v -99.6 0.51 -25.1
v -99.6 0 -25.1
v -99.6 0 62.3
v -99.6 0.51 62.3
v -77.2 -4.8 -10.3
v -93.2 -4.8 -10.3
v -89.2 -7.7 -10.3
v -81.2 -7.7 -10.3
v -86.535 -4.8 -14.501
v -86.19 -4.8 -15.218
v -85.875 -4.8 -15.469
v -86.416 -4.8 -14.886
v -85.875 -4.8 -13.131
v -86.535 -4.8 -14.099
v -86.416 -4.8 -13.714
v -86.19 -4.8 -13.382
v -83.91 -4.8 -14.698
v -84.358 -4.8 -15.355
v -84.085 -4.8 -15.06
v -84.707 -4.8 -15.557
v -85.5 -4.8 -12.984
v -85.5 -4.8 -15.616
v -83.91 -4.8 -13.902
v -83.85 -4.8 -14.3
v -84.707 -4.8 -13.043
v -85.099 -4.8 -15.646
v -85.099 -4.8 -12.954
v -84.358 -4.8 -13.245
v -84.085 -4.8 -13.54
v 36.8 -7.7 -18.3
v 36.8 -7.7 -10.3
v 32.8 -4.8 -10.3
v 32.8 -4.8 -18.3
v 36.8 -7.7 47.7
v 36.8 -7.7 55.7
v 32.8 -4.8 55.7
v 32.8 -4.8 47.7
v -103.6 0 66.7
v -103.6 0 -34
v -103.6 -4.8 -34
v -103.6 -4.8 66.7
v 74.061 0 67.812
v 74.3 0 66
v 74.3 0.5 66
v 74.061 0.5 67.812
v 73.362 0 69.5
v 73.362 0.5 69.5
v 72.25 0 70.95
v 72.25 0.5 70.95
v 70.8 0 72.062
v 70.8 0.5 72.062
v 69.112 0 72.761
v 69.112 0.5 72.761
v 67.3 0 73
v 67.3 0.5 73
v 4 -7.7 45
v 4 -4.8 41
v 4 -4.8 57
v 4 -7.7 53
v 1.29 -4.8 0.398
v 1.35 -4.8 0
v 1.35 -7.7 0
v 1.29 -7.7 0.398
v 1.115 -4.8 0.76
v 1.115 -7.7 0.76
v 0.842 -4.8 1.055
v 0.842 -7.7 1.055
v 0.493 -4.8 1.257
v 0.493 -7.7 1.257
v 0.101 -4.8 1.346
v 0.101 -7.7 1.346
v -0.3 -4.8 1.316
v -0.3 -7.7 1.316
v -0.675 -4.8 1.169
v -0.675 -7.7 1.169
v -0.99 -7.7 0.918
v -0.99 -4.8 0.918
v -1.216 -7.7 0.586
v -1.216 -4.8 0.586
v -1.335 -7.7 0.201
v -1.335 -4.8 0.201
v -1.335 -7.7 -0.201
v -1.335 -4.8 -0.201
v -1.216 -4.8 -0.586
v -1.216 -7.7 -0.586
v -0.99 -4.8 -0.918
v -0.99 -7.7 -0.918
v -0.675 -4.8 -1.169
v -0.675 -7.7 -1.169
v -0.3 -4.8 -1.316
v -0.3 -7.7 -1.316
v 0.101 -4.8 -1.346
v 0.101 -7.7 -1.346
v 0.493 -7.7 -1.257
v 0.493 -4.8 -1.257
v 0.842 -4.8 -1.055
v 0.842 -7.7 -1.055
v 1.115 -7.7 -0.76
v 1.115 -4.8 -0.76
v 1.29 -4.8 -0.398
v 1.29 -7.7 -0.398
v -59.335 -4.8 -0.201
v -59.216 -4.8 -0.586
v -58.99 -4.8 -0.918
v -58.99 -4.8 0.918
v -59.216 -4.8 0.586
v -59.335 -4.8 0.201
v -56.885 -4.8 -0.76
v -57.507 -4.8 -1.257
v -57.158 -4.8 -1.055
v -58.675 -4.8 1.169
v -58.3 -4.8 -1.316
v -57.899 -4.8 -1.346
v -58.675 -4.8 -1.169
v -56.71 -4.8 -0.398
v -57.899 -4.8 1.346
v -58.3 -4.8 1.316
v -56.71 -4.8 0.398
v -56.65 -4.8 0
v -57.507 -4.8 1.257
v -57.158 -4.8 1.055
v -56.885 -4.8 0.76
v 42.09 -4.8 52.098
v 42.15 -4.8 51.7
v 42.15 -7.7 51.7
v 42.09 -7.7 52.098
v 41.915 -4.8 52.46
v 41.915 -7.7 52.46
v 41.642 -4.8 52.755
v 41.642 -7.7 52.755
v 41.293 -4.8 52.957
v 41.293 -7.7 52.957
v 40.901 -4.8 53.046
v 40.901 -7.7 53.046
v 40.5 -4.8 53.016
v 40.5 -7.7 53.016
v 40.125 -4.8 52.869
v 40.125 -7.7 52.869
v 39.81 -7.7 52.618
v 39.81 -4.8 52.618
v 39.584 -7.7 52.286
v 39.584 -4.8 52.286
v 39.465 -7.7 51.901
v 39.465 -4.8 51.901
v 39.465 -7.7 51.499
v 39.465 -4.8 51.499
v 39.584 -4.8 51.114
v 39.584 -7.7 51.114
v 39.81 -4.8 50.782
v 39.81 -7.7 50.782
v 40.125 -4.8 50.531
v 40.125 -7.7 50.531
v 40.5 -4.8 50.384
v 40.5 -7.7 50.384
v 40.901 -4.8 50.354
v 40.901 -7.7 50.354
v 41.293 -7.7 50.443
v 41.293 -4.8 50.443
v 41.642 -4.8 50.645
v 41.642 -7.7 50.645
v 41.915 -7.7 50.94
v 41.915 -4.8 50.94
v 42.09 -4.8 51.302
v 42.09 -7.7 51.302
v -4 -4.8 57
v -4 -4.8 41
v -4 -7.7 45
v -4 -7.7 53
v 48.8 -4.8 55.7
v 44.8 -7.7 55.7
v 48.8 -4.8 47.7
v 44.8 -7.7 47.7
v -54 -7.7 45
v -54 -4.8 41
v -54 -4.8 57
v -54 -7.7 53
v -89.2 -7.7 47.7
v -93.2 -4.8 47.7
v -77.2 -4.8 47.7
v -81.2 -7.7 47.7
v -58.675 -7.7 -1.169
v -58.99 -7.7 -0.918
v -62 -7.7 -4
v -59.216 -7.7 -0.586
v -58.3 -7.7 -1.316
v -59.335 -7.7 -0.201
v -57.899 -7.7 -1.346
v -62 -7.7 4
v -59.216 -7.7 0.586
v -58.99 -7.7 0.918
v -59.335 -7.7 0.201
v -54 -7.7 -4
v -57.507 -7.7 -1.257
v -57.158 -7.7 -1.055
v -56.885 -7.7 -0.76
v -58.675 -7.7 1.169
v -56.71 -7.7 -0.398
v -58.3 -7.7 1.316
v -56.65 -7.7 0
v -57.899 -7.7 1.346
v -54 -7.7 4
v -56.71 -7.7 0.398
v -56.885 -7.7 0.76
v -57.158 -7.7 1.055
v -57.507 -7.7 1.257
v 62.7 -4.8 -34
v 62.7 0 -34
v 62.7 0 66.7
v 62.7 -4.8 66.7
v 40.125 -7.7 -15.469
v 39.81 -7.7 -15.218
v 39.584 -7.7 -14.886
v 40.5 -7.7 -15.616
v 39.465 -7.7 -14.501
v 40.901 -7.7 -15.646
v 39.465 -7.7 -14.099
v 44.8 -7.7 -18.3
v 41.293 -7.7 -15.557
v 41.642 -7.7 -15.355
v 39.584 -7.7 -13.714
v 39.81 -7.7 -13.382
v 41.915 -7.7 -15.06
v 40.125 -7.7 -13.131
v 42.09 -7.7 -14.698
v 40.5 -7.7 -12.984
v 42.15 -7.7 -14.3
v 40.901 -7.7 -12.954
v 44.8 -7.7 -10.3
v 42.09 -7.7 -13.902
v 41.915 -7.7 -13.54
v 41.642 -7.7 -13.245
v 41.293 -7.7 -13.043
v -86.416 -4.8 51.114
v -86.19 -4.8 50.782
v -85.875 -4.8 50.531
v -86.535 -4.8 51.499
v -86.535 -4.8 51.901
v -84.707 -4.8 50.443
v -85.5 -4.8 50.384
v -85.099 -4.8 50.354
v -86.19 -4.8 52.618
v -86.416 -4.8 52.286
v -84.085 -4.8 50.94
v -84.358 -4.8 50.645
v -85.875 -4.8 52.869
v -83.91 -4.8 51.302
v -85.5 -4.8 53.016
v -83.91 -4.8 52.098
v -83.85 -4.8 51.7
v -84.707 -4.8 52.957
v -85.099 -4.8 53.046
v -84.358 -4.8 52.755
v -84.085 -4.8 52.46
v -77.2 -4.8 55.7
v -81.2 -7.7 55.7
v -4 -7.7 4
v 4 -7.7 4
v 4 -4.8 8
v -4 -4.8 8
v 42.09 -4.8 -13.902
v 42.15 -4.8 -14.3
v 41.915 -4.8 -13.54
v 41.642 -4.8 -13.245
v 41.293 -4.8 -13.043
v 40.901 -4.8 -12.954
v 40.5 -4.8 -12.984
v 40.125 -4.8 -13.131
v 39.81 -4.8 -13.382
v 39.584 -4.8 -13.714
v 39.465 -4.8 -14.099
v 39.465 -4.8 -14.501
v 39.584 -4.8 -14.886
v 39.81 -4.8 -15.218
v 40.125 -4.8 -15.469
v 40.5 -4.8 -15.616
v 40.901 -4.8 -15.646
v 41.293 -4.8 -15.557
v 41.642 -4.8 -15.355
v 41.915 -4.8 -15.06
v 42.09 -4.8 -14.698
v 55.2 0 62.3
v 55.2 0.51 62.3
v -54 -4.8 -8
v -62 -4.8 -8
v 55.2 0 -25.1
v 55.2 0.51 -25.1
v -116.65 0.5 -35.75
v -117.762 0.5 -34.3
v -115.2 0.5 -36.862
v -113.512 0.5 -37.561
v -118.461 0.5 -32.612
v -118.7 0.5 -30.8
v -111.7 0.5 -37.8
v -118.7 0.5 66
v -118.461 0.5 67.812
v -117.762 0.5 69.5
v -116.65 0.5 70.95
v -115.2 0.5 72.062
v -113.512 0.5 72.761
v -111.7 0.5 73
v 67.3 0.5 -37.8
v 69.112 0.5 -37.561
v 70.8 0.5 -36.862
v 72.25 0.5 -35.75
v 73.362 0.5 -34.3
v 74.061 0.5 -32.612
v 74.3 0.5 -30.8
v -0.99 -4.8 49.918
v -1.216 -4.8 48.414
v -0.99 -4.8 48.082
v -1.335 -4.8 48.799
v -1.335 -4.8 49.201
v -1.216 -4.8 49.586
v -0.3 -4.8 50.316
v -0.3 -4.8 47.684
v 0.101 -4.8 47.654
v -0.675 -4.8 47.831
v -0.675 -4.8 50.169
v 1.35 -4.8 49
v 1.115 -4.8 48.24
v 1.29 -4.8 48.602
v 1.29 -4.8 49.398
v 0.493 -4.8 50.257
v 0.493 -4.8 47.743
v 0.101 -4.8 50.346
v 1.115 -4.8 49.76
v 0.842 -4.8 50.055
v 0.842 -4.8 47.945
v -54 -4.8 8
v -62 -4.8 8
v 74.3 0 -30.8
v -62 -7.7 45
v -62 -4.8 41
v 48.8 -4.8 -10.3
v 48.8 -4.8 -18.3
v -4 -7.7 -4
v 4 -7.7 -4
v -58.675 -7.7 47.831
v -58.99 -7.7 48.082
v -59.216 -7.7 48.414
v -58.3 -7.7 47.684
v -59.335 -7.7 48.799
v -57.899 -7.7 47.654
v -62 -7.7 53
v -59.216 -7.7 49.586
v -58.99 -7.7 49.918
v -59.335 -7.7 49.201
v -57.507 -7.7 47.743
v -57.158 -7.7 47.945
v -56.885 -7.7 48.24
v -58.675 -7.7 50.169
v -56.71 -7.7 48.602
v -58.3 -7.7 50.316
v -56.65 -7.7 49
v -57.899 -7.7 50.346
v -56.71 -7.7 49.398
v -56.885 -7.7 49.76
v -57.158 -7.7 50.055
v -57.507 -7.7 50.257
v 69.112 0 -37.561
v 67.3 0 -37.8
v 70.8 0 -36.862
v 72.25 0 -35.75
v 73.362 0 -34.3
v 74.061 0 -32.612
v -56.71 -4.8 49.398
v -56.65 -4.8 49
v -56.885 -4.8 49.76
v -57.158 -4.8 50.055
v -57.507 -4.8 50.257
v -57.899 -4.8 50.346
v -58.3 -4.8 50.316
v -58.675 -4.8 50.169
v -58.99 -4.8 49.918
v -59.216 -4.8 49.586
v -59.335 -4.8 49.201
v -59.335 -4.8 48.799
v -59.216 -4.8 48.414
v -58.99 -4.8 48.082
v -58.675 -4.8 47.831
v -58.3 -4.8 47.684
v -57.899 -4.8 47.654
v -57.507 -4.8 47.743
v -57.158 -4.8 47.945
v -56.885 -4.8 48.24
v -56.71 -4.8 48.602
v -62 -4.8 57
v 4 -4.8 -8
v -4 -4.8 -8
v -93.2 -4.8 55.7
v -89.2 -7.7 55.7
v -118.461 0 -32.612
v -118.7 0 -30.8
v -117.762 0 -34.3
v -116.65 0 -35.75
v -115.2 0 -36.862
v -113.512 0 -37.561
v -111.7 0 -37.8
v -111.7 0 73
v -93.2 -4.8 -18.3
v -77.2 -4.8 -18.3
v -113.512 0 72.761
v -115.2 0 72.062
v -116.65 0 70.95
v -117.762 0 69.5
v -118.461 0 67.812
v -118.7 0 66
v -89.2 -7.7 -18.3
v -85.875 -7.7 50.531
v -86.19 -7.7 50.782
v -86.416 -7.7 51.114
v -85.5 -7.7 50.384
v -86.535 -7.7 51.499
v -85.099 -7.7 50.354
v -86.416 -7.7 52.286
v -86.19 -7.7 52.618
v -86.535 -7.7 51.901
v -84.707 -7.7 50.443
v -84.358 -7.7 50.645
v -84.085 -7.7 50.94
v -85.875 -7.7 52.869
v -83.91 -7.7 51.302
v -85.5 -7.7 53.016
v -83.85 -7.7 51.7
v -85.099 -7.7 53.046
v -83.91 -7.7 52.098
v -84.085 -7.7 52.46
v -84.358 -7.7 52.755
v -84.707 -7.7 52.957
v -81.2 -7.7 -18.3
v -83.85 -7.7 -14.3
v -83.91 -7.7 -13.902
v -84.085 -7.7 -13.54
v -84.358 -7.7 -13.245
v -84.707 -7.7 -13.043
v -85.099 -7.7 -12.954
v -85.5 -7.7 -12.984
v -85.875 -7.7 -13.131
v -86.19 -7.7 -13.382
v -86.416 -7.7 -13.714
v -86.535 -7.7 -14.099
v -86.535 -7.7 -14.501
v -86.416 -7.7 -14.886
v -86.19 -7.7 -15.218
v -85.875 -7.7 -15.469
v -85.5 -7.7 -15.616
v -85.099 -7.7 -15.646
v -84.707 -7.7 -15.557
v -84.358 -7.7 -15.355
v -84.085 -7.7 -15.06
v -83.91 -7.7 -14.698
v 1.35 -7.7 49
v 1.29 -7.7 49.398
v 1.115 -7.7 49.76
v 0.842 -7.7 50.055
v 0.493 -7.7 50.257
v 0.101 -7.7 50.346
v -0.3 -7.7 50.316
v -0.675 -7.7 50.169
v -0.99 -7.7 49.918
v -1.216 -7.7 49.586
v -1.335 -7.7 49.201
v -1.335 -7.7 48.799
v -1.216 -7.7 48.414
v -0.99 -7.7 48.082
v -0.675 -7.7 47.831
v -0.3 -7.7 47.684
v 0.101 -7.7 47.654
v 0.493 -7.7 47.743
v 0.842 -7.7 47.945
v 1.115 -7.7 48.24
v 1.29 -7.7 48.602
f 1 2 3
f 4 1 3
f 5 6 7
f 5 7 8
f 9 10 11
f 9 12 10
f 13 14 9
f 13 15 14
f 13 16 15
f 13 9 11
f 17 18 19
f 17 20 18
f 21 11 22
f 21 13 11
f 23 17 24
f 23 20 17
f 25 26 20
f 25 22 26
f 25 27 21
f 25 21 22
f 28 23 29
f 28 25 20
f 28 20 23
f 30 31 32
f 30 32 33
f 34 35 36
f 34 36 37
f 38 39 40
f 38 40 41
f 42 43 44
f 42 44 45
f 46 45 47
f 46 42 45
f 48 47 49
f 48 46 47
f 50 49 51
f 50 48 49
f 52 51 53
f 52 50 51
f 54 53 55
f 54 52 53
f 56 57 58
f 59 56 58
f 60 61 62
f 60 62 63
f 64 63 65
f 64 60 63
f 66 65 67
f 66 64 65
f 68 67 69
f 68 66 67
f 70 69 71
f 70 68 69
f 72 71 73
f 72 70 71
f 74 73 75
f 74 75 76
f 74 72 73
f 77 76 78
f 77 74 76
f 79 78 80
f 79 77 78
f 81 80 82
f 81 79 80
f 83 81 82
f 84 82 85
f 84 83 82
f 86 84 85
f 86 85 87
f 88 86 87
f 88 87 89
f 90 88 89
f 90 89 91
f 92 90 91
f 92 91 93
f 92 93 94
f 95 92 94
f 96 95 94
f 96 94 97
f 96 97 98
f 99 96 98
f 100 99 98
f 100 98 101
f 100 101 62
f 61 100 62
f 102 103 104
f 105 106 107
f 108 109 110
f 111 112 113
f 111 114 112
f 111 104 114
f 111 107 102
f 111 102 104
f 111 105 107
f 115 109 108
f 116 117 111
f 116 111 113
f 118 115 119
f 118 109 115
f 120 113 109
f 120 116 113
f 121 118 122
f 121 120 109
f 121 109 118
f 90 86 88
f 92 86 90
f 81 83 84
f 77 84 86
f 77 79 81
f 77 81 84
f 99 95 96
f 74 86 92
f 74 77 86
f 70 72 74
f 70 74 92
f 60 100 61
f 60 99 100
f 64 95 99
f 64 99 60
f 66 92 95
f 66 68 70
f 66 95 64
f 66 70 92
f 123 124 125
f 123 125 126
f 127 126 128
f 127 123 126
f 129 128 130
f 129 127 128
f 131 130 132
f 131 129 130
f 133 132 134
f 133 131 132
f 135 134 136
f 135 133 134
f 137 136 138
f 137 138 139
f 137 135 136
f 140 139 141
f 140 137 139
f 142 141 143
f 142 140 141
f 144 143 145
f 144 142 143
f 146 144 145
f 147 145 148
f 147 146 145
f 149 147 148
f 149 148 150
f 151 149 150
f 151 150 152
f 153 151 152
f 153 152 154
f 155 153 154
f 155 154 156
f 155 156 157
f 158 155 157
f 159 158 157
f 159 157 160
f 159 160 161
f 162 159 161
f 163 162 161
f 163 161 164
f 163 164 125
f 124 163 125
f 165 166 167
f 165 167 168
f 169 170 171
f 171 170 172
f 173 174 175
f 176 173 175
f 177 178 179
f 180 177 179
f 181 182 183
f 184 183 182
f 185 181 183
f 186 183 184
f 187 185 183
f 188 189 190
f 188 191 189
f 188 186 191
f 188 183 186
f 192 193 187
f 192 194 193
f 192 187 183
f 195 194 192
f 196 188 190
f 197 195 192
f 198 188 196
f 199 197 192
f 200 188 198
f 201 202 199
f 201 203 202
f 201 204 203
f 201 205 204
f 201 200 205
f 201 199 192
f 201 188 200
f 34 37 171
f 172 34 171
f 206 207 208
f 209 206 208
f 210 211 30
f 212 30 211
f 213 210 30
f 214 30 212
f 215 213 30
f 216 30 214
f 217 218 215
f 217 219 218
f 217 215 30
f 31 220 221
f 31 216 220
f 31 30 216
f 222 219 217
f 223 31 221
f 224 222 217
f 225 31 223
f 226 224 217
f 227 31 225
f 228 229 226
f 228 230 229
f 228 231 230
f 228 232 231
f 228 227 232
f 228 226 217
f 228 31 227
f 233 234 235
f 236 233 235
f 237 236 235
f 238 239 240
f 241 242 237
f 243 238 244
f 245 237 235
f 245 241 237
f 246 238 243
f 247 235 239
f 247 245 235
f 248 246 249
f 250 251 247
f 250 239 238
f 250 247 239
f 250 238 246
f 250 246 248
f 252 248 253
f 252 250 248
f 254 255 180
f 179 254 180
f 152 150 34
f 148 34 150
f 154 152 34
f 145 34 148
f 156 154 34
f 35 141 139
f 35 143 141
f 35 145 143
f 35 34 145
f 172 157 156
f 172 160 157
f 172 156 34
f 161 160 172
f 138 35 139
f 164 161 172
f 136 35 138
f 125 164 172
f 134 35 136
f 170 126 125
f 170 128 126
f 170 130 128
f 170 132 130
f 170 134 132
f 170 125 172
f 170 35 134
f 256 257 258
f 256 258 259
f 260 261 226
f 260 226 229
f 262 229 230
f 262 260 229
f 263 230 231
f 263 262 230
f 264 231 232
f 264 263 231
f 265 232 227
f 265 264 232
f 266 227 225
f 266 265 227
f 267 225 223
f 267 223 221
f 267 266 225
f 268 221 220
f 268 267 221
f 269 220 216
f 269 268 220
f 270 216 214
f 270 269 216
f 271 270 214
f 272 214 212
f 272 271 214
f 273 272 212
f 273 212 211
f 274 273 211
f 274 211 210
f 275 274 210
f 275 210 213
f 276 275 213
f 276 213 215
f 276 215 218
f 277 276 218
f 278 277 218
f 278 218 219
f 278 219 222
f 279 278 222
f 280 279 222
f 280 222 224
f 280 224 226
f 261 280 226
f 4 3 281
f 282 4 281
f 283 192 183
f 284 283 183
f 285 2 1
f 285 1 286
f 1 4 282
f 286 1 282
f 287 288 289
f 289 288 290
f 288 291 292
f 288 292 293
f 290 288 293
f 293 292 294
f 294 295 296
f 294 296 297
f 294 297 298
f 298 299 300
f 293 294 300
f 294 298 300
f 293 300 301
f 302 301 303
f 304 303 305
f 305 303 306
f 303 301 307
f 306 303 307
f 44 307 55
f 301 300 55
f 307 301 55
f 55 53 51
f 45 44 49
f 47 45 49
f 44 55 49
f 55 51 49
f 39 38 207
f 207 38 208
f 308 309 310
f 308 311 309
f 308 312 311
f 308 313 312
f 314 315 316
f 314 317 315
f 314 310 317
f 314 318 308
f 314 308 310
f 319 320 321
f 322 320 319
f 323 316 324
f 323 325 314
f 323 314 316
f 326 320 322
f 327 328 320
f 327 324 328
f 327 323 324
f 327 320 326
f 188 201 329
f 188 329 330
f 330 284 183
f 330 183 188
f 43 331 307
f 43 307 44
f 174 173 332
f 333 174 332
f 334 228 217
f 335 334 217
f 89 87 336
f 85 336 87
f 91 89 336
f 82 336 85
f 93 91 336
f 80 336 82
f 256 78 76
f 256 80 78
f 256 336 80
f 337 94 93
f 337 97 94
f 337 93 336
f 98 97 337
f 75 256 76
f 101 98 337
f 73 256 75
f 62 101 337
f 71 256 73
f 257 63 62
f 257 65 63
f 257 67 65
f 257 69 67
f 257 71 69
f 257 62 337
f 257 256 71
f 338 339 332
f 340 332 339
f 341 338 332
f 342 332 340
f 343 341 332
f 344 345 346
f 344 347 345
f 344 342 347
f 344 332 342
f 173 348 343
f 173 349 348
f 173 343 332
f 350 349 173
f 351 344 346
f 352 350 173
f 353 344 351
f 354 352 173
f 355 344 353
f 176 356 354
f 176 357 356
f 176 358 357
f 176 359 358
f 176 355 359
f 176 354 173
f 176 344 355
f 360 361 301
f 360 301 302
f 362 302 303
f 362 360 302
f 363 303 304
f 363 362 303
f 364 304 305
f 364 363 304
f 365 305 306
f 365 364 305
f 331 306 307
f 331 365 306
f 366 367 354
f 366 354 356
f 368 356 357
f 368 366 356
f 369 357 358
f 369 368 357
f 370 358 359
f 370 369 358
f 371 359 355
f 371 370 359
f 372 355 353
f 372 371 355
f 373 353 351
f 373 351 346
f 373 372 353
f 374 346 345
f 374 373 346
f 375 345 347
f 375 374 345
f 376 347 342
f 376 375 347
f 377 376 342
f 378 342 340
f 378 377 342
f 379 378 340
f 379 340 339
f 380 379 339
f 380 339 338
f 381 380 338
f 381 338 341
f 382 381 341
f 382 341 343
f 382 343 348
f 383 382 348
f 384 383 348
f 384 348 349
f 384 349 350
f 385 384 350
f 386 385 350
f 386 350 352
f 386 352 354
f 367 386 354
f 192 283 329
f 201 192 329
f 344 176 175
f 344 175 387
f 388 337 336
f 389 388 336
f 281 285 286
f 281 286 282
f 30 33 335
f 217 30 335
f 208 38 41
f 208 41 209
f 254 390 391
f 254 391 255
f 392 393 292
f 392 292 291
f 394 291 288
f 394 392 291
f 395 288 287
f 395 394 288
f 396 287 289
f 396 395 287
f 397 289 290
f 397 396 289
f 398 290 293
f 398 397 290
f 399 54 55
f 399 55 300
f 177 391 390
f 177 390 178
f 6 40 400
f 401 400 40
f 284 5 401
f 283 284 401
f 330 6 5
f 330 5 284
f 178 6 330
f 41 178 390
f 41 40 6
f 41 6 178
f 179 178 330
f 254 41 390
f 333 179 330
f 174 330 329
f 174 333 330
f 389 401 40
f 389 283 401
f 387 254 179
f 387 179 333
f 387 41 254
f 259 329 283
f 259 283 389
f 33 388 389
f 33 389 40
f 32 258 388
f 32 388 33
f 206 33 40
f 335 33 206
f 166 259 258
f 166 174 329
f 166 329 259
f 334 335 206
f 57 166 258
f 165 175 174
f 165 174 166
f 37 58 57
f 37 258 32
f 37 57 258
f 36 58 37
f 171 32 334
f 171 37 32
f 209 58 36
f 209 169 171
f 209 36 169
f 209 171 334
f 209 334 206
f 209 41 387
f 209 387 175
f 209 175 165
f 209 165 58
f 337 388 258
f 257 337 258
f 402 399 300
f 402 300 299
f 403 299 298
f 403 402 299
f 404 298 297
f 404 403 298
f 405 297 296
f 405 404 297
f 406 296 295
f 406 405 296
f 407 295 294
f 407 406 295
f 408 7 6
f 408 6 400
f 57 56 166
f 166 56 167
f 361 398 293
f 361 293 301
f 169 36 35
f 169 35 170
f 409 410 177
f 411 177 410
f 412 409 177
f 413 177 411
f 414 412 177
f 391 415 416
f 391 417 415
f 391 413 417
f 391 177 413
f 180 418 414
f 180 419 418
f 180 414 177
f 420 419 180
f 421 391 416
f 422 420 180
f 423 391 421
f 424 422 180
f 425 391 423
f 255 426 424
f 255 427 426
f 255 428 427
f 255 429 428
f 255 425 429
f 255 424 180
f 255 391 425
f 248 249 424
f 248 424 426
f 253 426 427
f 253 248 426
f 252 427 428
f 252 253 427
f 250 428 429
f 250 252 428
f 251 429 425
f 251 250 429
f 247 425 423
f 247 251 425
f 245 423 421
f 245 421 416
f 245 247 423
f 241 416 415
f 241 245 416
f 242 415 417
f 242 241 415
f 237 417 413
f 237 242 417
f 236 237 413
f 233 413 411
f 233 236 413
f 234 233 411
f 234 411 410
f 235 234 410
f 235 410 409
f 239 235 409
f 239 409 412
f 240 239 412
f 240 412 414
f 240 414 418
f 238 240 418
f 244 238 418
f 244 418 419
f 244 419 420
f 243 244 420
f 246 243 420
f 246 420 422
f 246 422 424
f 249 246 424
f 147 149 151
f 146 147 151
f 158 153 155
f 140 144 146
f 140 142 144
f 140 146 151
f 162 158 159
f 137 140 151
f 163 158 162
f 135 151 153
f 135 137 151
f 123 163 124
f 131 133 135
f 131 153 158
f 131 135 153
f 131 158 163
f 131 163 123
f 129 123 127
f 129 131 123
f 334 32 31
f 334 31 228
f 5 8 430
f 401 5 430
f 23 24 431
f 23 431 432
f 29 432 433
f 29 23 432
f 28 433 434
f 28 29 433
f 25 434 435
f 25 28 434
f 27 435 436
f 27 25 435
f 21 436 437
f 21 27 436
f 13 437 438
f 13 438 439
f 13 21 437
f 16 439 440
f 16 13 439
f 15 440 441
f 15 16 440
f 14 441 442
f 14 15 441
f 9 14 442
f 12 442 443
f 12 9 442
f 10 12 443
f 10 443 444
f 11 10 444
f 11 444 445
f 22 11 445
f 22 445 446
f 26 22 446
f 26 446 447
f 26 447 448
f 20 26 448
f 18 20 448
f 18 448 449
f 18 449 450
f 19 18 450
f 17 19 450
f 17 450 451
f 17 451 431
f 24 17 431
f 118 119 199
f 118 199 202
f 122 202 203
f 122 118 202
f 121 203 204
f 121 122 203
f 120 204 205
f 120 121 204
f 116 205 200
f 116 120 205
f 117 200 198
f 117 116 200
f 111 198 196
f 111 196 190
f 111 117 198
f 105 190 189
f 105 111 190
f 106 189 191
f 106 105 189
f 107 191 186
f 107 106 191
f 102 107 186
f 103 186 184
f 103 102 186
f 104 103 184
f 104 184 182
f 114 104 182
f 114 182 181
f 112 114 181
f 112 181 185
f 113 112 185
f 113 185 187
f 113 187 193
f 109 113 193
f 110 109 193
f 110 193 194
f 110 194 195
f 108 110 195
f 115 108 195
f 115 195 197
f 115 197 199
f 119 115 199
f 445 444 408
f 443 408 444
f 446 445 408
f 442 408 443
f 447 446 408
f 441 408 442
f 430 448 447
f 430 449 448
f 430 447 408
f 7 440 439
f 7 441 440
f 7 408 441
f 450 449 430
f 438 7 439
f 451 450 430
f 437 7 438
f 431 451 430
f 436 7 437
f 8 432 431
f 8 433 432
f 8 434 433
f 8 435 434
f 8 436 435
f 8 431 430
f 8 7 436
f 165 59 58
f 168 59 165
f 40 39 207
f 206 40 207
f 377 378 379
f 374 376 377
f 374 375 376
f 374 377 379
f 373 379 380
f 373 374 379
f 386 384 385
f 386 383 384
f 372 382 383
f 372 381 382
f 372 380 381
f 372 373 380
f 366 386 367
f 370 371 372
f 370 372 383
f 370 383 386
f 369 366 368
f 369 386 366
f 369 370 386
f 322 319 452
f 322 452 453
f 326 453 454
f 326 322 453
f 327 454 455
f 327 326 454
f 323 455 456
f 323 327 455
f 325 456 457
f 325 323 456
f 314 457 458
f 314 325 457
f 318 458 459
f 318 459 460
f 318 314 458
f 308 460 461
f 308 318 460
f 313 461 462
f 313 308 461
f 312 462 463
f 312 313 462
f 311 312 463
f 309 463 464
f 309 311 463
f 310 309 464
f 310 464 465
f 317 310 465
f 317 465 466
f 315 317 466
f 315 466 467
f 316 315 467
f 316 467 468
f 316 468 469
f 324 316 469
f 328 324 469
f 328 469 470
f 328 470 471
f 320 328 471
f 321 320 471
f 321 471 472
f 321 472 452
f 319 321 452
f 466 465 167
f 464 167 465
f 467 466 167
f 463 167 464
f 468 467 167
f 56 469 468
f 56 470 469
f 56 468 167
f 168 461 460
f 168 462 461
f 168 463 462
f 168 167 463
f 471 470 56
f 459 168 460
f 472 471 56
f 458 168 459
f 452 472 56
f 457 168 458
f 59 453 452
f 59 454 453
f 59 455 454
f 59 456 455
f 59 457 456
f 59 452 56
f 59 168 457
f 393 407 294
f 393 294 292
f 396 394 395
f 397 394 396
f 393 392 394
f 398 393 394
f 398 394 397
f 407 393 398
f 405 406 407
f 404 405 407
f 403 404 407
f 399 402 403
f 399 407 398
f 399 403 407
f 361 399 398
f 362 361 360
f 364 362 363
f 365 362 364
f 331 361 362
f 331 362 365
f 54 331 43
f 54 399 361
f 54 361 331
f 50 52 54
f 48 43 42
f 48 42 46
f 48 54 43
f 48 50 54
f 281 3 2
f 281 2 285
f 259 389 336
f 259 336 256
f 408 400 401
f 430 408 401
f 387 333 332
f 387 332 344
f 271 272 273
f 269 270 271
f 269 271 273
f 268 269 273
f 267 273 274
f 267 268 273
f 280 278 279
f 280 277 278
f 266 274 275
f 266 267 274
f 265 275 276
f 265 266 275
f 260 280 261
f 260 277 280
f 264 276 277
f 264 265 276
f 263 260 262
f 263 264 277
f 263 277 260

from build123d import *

# Parameters (mm, degrees)
F0_W     = 166.3
F0_H     = 100.7
F0_W_2   = 154.8
F0_H_2   = 87.4
F0_W_3   = 8
F0_H_3   = 8
F0_R     = 1.35
F1_DEPTH = 0.5
F2_DEPTH = 4.8
F3_DEPTH = 7.7
F4_SIZE2 = 2.89999
F4_SIZE  = 3.99999
F5_DEPTH = 0.51


# Not quite as in the source:
# - a fillet or chamfer is up to 0.001 mm smaller than in the source, because OpenCascade refuses the exact size


with BuildPart() as f1:
    # F0 (on Front) → F1 (new body)
    with BuildSketch(Plane.XZ):
        with BuildLine():
            Line((67.3, 73), (-111.7, 73))
            ThreePointArc((-111.7, 73), (-116.6497474683, 70.9497474683), (-118.7, 66))
            Line((-118.7, 66), (-118.7, -30.8))
            ThreePointArc((-118.7, -30.8), (-116.6497474683, -35.7497474683), (-111.7, -37.8))
            Line((-111.7, -37.8), (67.3, -37.8))
            ThreePointArc((67.3, -37.8), (72.2497474683, -35.7497474683), (74.3, -30.8))
            Line((74.3, -30.8), (74.3, 66))
            ThreePointArc((74.3, 66), (72.2497474683, 70.9497474683), (67.3, 73))
        make_face()
        with Locations((-20.45, 16.35)):
            Rectangle(F0_W, F0_H, mode=Mode.SUBTRACT)
        with Locations((-20.45, 16.35)):
            Rectangle(F0_W, F0_H)
        with Locations((-22.2, 18.6)):
            Rectangle(F0_W_2, F0_H_2, mode=Mode.SUBTRACT)
        with Locations((-22.2, 18.6)):
            Rectangle(F0_W_2, F0_H_2)
        with Locations((-85.2, -14.3)):
            Rectangle(F0_W_3, F0_H_3, mode=Mode.SUBTRACT)
        with Locations((-58, 0)):
            Rectangle(F0_W_3, F0_H_3, mode=Mode.SUBTRACT)
        with Locations((40.8, -14.3)):
            Rectangle(F0_W_3, F0_H_3, mode=Mode.SUBTRACT)
        Rectangle(F0_W_3, F0_H_3, mode=Mode.SUBTRACT)
        with Locations((-85.2, 51.7)):
            Rectangle(F0_W_3, F0_H_3, mode=Mode.SUBTRACT)
        with Locations((-58, 49)):
            Rectangle(F0_W_3, F0_H_3, mode=Mode.SUBTRACT)
        with Locations((0, 49)):
            Rectangle(F0_W_3, F0_H_3, mode=Mode.SUBTRACT)
        with Locations((40.8, 51.7)):
            Rectangle(F0_W_3, F0_H_3, mode=Mode.SUBTRACT)
        with Locations((-58, 49)):
            Rectangle(F0_W_3, F0_H_3)
        with Locations((-58, 49)):
            Circle(F0_R, mode=Mode.SUBTRACT)
        with Locations((-85.2, 51.7)):
            Rectangle(F0_W_3, F0_H_3)
        with Locations((-85.2, 51.7)):
            Circle(F0_R, mode=Mode.SUBTRACT)
        with Locations((40.8, 51.7)):
            Rectangle(F0_W_3, F0_H_3)
        with Locations((40.8, 51.7)):
            Circle(F0_R, mode=Mode.SUBTRACT)
        Rectangle(F0_W_3, F0_H_3)
        Circle(F0_R, mode=Mode.SUBTRACT)
        with Locations((40.8, -14.3)):
            Rectangle(F0_W_3, F0_H_3)
        with Locations((40.8, -14.3)):
            Circle(F0_R, mode=Mode.SUBTRACT)
        with Locations((0, 49)):
            Rectangle(F0_W_3, F0_H_3)
        with Locations((0, 49)):
            Circle(F0_R, mode=Mode.SUBTRACT)
        with Locations((-58, 0)):
            Rectangle(F0_W_3, F0_H_3)
        with Locations((-58, 0)):
            Circle(F0_R, mode=Mode.SUBTRACT)
        with Locations((-85.2, -14.3)):
            Rectangle(F0_W_3, F0_H_3)
        with Locations((-85.2, -14.3)):
            Circle(F0_R, mode=Mode.SUBTRACT)
        with Locations((0, 49)):
            Circle(F0_R)
        with Locations((40.8, 51.7)):
            Circle(F0_R)
        with Locations((40.8, -14.3)):
            Circle(F0_R)
        Circle(F0_R)
        with Locations((-58, 49)):
            Circle(F0_R)
        with Locations((-58, 0)):
            Circle(F0_R)
        with Locations((-85.2, 51.7)):
            Circle(F0_R)
        with Locations((-85.2, -14.3)):
            Circle(F0_R)
    extrude(amount=-F1_DEPTH)


with BuildPart() as f2:
    # F0 (on Front) → F2 (new body)
    with BuildSketch(Plane.XZ):
        with Locations((-20.45, 16.35)):
            Rectangle(F0_W, F0_H)
        with Locations((-22.2, 18.6)):
            Rectangle(F0_W_2, F0_H_2, mode=Mode.SUBTRACT)
        with Locations((-22.2, 18.6)):
            Rectangle(F0_W_2, F0_H_2)
        with Locations((-85.2, -14.3)):
            Rectangle(F0_W_3, F0_H_3, mode=Mode.SUBTRACT)
        with Locations((-58, 0)):
            Rectangle(F0_W_3, F0_H_3, mode=Mode.SUBTRACT)
        with Locations((40.8, -14.3)):
            Rectangle(F0_W_3, F0_H_3, mode=Mode.SUBTRACT)
        Rectangle(F0_W_3, F0_H_3, mode=Mode.SUBTRACT)
        with Locations((-85.2, 51.7)):
            Rectangle(F0_W_3, F0_H_3, mode=Mode.SUBTRACT)
        with Locations((-58, 49)):
            Rectangle(F0_W_3, F0_H_3, mode=Mode.SUBTRACT)
        with Locations((0, 49)):
            Rectangle(F0_W_3, F0_H_3, mode=Mode.SUBTRACT)
        with Locations((40.8, 51.7)):
            Rectangle(F0_W_3, F0_H_3, mode=Mode.SUBTRACT)
        with Locations((40.8, 51.7)):
            Rectangle(F0_W_3, F0_H_3)
        with Locations((40.8, 51.7)):
            Circle(F0_R, mode=Mode.SUBTRACT)
        with Locations((0, 49)):
            Rectangle(F0_W_3, F0_H_3)
        with Locations((0, 49)):
            Circle(F0_R, mode=Mode.SUBTRACT)
        with Locations((-58, 49)):
            Rectangle(F0_W_3, F0_H_3)
        with Locations((-58, 49)):
            Circle(F0_R, mode=Mode.SUBTRACT)
        with Locations((-85.2, 51.7)):
            Rectangle(F0_W_3, F0_H_3)
        with Locations((-85.2, 51.7)):
            Circle(F0_R, mode=Mode.SUBTRACT)
        with Locations((-58, 0)):
            Rectangle(F0_W_3, F0_H_3)
        with Locations((-58, 0)):
            Circle(F0_R, mode=Mode.SUBTRACT)
        with Locations((-85.2, -14.3)):
            Rectangle(F0_W_3, F0_H_3)
        with Locations((-85.2, -14.3)):
            Circle(F0_R, mode=Mode.SUBTRACT)
        Rectangle(F0_W_3, F0_H_3)
        Circle(F0_R, mode=Mode.SUBTRACT)
        with Locations((40.8, -14.3)):
            Rectangle(F0_W_3, F0_H_3)
        with Locations((40.8, -14.3)):
            Circle(F0_R, mode=Mode.SUBTRACT)
        with Locations((40.8, 51.7)):
            Circle(F0_R)
        with Locations((0, 49)):
            Circle(F0_R)
        with Locations((-58, 49)):
            Circle(F0_R)
        with Locations((-85.2, 51.7)):
            Circle(F0_R)
        with Locations((-58, 0)):
            Circle(F0_R)
        with Locations((-85.2, -14.3)):
            Circle(F0_R)
        Circle(F0_R)
        with Locations((40.8, -14.3)):
            Circle(F0_R)
    extrude(amount=F2_DEPTH)

    # F0 (on Front) → F3 (join)
    with BuildSketch(Plane.XZ):
        with Locations((-58, 49)):
            Rectangle(F0_W_3, F0_H_3)
        with Locations((-58, 49)):
            Circle(F0_R, mode=Mode.SUBTRACT)
        with Locations((0, 49)):
            Rectangle(F0_W_3, F0_H_3)
        with Locations((0, 49)):
            Circle(F0_R, mode=Mode.SUBTRACT)
        with Locations((40.8, 51.7)):
            Rectangle(F0_W_3, F0_H_3)
        with Locations((40.8, 51.7)):
            Circle(F0_R, mode=Mode.SUBTRACT)
        with Locations((40.8, -14.3)):
            Rectangle(F0_W_3, F0_H_3)
        with Locations((40.8, -14.3)):
            Circle(F0_R, mode=Mode.SUBTRACT)
        Rectangle(F0_W_3, F0_H_3)
        Circle(F0_R, mode=Mode.SUBTRACT)
        with Locations((-58, 0)):
            Rectangle(F0_W_3, F0_H_3)
        with Locations((-58, 0)):
            Circle(F0_R, mode=Mode.SUBTRACT)
        with Locations((-85.2, -14.3)):
            Rectangle(F0_W_3, F0_H_3)
        with Locations((-85.2, -14.3)):
            Circle(F0_R, mode=Mode.SUBTRACT)
        with Locations((-85.2, 51.7)):
            Rectangle(F0_W_3, F0_H_3)
        with Locations((-85.2, 51.7)):
            Circle(F0_R, mode=Mode.SUBTRACT)
    extrude(amount=F3_DEPTH)

    # F4 (size 4 and 2.9 in the source; OpenCascade refuses exactly that, so slightly less here)
    f4_edges = [f2.edges().sort_by_distance(p)[0] for p in [
        (-58, -4.8, 53),
        (-58, -4.8, 45),
        (-89.2, -4.8, 51.7),
        (-81.2, -4.8, 51.7),
        (0, -4.8, 45),
        (0, -4.8, -4),
        (44.8, -4.8, -14.3),
        (44.8, -4.8, 51.7),
        (-58, -4.8, -4),
        (-81.2, -4.8, -14.3),
        (-89.2, -4.8, -14.3),
        (36.8, -4.8, 51.7),
        (36.8, -4.8, -14.3),
        (0, -4.8, 53),
        (0, -4.8, 4),
        (-58, -4.8, 4),
    ]]
    chamfer(f4_edges, length=F4_SIZE, length2=F4_SIZE2)


with BuildPart() as f5:
    # F0 (on Front) → F5 (new body)
    with BuildSketch(Plane.XZ):
        with Locations((-22.2, 18.6)):
            Rectangle(F0_W_2, F0_H_2)
        with Locations((-85.2, -14.3)):
            Rectangle(F0_W_3, F0_H_3, mode=Mode.SUBTRACT)
        with Locations((-58, 0)):
            Rectangle(F0_W_3, F0_H_3, mode=Mode.SUBTRACT)
        with Locations((40.8, -14.3)):
            Rectangle(F0_W_3, F0_H_3, mode=Mode.SUBTRACT)
        Rectangle(F0_W_3, F0_H_3, mode=Mode.SUBTRACT)
        with Locations((-85.2, 51.7)):
            Rectangle(F0_W_3, F0_H_3, mode=Mode.SUBTRACT)
        with Locations((-58, 49)):
            Rectangle(F0_W_3, F0_H_3, mode=Mode.SUBTRACT)
        with Locations((0, 49)):
            Rectangle(F0_W_3, F0_H_3, mode=Mode.SUBTRACT)
        with Locations((40.8, 51.7)):
            Rectangle(F0_W_3, F0_H_3, mode=Mode.SUBTRACT)
        with Locations((40.8, 51.7)):
            Rectangle(F0_W_3, F0_H_3)
        with Locations((40.8, 51.7)):
            Circle(F0_R, mode=Mode.SUBTRACT)
        with Locations((40.8, -14.3)):
            Rectangle(F0_W_3, F0_H_3)
        with Locations((40.8, -14.3)):
            Circle(F0_R, mode=Mode.SUBTRACT)
        with Locations((0, 49)):
            Rectangle(F0_W_3, F0_H_3)
        with Locations((0, 49)):
            Circle(F0_R, mode=Mode.SUBTRACT)
        with Locations((-58, 49)):
            Rectangle(F0_W_3, F0_H_3)
        with Locations((-58, 49)):
            Circle(F0_R, mode=Mode.SUBTRACT)
        with Locations((-85.2, 51.7)):
            Rectangle(F0_W_3, F0_H_3)
        with Locations((-85.2, 51.7)):
            Circle(F0_R, mode=Mode.SUBTRACT)
        with Locations((-58, 0)):
            Rectangle(F0_W_3, F0_H_3)
        with Locations((-58, 0)):
            Circle(F0_R, mode=Mode.SUBTRACT)
        with Locations((-85.2, -14.3)):
            Rectangle(F0_W_3, F0_H_3)
        with Locations((-85.2, -14.3)):
            Circle(F0_R, mode=Mode.SUBTRACT)
        Rectangle(F0_W_3, F0_H_3)
        Circle(F0_R, mode=Mode.SUBTRACT)
        with Locations((40.8, 51.7)):
            Circle(F0_R)
        with Locations((40.8, -14.3)):
            Circle(F0_R)
        Circle(F0_R)
        with Locations((0, 49)):
            Circle(F0_R)
        with Locations((-58, 49)):
            Circle(F0_R)
        with Locations((-58, 0)):
            Circle(F0_R)
        with Locations((-85.2, 51.7)):
            Circle(F0_R)
        with Locations((-85.2, -14.3)):
            Circle(F0_R)
    extrude(amount=-F5_DEPTH)


solid = Compound([f1.part, f2.part, f5.part])
